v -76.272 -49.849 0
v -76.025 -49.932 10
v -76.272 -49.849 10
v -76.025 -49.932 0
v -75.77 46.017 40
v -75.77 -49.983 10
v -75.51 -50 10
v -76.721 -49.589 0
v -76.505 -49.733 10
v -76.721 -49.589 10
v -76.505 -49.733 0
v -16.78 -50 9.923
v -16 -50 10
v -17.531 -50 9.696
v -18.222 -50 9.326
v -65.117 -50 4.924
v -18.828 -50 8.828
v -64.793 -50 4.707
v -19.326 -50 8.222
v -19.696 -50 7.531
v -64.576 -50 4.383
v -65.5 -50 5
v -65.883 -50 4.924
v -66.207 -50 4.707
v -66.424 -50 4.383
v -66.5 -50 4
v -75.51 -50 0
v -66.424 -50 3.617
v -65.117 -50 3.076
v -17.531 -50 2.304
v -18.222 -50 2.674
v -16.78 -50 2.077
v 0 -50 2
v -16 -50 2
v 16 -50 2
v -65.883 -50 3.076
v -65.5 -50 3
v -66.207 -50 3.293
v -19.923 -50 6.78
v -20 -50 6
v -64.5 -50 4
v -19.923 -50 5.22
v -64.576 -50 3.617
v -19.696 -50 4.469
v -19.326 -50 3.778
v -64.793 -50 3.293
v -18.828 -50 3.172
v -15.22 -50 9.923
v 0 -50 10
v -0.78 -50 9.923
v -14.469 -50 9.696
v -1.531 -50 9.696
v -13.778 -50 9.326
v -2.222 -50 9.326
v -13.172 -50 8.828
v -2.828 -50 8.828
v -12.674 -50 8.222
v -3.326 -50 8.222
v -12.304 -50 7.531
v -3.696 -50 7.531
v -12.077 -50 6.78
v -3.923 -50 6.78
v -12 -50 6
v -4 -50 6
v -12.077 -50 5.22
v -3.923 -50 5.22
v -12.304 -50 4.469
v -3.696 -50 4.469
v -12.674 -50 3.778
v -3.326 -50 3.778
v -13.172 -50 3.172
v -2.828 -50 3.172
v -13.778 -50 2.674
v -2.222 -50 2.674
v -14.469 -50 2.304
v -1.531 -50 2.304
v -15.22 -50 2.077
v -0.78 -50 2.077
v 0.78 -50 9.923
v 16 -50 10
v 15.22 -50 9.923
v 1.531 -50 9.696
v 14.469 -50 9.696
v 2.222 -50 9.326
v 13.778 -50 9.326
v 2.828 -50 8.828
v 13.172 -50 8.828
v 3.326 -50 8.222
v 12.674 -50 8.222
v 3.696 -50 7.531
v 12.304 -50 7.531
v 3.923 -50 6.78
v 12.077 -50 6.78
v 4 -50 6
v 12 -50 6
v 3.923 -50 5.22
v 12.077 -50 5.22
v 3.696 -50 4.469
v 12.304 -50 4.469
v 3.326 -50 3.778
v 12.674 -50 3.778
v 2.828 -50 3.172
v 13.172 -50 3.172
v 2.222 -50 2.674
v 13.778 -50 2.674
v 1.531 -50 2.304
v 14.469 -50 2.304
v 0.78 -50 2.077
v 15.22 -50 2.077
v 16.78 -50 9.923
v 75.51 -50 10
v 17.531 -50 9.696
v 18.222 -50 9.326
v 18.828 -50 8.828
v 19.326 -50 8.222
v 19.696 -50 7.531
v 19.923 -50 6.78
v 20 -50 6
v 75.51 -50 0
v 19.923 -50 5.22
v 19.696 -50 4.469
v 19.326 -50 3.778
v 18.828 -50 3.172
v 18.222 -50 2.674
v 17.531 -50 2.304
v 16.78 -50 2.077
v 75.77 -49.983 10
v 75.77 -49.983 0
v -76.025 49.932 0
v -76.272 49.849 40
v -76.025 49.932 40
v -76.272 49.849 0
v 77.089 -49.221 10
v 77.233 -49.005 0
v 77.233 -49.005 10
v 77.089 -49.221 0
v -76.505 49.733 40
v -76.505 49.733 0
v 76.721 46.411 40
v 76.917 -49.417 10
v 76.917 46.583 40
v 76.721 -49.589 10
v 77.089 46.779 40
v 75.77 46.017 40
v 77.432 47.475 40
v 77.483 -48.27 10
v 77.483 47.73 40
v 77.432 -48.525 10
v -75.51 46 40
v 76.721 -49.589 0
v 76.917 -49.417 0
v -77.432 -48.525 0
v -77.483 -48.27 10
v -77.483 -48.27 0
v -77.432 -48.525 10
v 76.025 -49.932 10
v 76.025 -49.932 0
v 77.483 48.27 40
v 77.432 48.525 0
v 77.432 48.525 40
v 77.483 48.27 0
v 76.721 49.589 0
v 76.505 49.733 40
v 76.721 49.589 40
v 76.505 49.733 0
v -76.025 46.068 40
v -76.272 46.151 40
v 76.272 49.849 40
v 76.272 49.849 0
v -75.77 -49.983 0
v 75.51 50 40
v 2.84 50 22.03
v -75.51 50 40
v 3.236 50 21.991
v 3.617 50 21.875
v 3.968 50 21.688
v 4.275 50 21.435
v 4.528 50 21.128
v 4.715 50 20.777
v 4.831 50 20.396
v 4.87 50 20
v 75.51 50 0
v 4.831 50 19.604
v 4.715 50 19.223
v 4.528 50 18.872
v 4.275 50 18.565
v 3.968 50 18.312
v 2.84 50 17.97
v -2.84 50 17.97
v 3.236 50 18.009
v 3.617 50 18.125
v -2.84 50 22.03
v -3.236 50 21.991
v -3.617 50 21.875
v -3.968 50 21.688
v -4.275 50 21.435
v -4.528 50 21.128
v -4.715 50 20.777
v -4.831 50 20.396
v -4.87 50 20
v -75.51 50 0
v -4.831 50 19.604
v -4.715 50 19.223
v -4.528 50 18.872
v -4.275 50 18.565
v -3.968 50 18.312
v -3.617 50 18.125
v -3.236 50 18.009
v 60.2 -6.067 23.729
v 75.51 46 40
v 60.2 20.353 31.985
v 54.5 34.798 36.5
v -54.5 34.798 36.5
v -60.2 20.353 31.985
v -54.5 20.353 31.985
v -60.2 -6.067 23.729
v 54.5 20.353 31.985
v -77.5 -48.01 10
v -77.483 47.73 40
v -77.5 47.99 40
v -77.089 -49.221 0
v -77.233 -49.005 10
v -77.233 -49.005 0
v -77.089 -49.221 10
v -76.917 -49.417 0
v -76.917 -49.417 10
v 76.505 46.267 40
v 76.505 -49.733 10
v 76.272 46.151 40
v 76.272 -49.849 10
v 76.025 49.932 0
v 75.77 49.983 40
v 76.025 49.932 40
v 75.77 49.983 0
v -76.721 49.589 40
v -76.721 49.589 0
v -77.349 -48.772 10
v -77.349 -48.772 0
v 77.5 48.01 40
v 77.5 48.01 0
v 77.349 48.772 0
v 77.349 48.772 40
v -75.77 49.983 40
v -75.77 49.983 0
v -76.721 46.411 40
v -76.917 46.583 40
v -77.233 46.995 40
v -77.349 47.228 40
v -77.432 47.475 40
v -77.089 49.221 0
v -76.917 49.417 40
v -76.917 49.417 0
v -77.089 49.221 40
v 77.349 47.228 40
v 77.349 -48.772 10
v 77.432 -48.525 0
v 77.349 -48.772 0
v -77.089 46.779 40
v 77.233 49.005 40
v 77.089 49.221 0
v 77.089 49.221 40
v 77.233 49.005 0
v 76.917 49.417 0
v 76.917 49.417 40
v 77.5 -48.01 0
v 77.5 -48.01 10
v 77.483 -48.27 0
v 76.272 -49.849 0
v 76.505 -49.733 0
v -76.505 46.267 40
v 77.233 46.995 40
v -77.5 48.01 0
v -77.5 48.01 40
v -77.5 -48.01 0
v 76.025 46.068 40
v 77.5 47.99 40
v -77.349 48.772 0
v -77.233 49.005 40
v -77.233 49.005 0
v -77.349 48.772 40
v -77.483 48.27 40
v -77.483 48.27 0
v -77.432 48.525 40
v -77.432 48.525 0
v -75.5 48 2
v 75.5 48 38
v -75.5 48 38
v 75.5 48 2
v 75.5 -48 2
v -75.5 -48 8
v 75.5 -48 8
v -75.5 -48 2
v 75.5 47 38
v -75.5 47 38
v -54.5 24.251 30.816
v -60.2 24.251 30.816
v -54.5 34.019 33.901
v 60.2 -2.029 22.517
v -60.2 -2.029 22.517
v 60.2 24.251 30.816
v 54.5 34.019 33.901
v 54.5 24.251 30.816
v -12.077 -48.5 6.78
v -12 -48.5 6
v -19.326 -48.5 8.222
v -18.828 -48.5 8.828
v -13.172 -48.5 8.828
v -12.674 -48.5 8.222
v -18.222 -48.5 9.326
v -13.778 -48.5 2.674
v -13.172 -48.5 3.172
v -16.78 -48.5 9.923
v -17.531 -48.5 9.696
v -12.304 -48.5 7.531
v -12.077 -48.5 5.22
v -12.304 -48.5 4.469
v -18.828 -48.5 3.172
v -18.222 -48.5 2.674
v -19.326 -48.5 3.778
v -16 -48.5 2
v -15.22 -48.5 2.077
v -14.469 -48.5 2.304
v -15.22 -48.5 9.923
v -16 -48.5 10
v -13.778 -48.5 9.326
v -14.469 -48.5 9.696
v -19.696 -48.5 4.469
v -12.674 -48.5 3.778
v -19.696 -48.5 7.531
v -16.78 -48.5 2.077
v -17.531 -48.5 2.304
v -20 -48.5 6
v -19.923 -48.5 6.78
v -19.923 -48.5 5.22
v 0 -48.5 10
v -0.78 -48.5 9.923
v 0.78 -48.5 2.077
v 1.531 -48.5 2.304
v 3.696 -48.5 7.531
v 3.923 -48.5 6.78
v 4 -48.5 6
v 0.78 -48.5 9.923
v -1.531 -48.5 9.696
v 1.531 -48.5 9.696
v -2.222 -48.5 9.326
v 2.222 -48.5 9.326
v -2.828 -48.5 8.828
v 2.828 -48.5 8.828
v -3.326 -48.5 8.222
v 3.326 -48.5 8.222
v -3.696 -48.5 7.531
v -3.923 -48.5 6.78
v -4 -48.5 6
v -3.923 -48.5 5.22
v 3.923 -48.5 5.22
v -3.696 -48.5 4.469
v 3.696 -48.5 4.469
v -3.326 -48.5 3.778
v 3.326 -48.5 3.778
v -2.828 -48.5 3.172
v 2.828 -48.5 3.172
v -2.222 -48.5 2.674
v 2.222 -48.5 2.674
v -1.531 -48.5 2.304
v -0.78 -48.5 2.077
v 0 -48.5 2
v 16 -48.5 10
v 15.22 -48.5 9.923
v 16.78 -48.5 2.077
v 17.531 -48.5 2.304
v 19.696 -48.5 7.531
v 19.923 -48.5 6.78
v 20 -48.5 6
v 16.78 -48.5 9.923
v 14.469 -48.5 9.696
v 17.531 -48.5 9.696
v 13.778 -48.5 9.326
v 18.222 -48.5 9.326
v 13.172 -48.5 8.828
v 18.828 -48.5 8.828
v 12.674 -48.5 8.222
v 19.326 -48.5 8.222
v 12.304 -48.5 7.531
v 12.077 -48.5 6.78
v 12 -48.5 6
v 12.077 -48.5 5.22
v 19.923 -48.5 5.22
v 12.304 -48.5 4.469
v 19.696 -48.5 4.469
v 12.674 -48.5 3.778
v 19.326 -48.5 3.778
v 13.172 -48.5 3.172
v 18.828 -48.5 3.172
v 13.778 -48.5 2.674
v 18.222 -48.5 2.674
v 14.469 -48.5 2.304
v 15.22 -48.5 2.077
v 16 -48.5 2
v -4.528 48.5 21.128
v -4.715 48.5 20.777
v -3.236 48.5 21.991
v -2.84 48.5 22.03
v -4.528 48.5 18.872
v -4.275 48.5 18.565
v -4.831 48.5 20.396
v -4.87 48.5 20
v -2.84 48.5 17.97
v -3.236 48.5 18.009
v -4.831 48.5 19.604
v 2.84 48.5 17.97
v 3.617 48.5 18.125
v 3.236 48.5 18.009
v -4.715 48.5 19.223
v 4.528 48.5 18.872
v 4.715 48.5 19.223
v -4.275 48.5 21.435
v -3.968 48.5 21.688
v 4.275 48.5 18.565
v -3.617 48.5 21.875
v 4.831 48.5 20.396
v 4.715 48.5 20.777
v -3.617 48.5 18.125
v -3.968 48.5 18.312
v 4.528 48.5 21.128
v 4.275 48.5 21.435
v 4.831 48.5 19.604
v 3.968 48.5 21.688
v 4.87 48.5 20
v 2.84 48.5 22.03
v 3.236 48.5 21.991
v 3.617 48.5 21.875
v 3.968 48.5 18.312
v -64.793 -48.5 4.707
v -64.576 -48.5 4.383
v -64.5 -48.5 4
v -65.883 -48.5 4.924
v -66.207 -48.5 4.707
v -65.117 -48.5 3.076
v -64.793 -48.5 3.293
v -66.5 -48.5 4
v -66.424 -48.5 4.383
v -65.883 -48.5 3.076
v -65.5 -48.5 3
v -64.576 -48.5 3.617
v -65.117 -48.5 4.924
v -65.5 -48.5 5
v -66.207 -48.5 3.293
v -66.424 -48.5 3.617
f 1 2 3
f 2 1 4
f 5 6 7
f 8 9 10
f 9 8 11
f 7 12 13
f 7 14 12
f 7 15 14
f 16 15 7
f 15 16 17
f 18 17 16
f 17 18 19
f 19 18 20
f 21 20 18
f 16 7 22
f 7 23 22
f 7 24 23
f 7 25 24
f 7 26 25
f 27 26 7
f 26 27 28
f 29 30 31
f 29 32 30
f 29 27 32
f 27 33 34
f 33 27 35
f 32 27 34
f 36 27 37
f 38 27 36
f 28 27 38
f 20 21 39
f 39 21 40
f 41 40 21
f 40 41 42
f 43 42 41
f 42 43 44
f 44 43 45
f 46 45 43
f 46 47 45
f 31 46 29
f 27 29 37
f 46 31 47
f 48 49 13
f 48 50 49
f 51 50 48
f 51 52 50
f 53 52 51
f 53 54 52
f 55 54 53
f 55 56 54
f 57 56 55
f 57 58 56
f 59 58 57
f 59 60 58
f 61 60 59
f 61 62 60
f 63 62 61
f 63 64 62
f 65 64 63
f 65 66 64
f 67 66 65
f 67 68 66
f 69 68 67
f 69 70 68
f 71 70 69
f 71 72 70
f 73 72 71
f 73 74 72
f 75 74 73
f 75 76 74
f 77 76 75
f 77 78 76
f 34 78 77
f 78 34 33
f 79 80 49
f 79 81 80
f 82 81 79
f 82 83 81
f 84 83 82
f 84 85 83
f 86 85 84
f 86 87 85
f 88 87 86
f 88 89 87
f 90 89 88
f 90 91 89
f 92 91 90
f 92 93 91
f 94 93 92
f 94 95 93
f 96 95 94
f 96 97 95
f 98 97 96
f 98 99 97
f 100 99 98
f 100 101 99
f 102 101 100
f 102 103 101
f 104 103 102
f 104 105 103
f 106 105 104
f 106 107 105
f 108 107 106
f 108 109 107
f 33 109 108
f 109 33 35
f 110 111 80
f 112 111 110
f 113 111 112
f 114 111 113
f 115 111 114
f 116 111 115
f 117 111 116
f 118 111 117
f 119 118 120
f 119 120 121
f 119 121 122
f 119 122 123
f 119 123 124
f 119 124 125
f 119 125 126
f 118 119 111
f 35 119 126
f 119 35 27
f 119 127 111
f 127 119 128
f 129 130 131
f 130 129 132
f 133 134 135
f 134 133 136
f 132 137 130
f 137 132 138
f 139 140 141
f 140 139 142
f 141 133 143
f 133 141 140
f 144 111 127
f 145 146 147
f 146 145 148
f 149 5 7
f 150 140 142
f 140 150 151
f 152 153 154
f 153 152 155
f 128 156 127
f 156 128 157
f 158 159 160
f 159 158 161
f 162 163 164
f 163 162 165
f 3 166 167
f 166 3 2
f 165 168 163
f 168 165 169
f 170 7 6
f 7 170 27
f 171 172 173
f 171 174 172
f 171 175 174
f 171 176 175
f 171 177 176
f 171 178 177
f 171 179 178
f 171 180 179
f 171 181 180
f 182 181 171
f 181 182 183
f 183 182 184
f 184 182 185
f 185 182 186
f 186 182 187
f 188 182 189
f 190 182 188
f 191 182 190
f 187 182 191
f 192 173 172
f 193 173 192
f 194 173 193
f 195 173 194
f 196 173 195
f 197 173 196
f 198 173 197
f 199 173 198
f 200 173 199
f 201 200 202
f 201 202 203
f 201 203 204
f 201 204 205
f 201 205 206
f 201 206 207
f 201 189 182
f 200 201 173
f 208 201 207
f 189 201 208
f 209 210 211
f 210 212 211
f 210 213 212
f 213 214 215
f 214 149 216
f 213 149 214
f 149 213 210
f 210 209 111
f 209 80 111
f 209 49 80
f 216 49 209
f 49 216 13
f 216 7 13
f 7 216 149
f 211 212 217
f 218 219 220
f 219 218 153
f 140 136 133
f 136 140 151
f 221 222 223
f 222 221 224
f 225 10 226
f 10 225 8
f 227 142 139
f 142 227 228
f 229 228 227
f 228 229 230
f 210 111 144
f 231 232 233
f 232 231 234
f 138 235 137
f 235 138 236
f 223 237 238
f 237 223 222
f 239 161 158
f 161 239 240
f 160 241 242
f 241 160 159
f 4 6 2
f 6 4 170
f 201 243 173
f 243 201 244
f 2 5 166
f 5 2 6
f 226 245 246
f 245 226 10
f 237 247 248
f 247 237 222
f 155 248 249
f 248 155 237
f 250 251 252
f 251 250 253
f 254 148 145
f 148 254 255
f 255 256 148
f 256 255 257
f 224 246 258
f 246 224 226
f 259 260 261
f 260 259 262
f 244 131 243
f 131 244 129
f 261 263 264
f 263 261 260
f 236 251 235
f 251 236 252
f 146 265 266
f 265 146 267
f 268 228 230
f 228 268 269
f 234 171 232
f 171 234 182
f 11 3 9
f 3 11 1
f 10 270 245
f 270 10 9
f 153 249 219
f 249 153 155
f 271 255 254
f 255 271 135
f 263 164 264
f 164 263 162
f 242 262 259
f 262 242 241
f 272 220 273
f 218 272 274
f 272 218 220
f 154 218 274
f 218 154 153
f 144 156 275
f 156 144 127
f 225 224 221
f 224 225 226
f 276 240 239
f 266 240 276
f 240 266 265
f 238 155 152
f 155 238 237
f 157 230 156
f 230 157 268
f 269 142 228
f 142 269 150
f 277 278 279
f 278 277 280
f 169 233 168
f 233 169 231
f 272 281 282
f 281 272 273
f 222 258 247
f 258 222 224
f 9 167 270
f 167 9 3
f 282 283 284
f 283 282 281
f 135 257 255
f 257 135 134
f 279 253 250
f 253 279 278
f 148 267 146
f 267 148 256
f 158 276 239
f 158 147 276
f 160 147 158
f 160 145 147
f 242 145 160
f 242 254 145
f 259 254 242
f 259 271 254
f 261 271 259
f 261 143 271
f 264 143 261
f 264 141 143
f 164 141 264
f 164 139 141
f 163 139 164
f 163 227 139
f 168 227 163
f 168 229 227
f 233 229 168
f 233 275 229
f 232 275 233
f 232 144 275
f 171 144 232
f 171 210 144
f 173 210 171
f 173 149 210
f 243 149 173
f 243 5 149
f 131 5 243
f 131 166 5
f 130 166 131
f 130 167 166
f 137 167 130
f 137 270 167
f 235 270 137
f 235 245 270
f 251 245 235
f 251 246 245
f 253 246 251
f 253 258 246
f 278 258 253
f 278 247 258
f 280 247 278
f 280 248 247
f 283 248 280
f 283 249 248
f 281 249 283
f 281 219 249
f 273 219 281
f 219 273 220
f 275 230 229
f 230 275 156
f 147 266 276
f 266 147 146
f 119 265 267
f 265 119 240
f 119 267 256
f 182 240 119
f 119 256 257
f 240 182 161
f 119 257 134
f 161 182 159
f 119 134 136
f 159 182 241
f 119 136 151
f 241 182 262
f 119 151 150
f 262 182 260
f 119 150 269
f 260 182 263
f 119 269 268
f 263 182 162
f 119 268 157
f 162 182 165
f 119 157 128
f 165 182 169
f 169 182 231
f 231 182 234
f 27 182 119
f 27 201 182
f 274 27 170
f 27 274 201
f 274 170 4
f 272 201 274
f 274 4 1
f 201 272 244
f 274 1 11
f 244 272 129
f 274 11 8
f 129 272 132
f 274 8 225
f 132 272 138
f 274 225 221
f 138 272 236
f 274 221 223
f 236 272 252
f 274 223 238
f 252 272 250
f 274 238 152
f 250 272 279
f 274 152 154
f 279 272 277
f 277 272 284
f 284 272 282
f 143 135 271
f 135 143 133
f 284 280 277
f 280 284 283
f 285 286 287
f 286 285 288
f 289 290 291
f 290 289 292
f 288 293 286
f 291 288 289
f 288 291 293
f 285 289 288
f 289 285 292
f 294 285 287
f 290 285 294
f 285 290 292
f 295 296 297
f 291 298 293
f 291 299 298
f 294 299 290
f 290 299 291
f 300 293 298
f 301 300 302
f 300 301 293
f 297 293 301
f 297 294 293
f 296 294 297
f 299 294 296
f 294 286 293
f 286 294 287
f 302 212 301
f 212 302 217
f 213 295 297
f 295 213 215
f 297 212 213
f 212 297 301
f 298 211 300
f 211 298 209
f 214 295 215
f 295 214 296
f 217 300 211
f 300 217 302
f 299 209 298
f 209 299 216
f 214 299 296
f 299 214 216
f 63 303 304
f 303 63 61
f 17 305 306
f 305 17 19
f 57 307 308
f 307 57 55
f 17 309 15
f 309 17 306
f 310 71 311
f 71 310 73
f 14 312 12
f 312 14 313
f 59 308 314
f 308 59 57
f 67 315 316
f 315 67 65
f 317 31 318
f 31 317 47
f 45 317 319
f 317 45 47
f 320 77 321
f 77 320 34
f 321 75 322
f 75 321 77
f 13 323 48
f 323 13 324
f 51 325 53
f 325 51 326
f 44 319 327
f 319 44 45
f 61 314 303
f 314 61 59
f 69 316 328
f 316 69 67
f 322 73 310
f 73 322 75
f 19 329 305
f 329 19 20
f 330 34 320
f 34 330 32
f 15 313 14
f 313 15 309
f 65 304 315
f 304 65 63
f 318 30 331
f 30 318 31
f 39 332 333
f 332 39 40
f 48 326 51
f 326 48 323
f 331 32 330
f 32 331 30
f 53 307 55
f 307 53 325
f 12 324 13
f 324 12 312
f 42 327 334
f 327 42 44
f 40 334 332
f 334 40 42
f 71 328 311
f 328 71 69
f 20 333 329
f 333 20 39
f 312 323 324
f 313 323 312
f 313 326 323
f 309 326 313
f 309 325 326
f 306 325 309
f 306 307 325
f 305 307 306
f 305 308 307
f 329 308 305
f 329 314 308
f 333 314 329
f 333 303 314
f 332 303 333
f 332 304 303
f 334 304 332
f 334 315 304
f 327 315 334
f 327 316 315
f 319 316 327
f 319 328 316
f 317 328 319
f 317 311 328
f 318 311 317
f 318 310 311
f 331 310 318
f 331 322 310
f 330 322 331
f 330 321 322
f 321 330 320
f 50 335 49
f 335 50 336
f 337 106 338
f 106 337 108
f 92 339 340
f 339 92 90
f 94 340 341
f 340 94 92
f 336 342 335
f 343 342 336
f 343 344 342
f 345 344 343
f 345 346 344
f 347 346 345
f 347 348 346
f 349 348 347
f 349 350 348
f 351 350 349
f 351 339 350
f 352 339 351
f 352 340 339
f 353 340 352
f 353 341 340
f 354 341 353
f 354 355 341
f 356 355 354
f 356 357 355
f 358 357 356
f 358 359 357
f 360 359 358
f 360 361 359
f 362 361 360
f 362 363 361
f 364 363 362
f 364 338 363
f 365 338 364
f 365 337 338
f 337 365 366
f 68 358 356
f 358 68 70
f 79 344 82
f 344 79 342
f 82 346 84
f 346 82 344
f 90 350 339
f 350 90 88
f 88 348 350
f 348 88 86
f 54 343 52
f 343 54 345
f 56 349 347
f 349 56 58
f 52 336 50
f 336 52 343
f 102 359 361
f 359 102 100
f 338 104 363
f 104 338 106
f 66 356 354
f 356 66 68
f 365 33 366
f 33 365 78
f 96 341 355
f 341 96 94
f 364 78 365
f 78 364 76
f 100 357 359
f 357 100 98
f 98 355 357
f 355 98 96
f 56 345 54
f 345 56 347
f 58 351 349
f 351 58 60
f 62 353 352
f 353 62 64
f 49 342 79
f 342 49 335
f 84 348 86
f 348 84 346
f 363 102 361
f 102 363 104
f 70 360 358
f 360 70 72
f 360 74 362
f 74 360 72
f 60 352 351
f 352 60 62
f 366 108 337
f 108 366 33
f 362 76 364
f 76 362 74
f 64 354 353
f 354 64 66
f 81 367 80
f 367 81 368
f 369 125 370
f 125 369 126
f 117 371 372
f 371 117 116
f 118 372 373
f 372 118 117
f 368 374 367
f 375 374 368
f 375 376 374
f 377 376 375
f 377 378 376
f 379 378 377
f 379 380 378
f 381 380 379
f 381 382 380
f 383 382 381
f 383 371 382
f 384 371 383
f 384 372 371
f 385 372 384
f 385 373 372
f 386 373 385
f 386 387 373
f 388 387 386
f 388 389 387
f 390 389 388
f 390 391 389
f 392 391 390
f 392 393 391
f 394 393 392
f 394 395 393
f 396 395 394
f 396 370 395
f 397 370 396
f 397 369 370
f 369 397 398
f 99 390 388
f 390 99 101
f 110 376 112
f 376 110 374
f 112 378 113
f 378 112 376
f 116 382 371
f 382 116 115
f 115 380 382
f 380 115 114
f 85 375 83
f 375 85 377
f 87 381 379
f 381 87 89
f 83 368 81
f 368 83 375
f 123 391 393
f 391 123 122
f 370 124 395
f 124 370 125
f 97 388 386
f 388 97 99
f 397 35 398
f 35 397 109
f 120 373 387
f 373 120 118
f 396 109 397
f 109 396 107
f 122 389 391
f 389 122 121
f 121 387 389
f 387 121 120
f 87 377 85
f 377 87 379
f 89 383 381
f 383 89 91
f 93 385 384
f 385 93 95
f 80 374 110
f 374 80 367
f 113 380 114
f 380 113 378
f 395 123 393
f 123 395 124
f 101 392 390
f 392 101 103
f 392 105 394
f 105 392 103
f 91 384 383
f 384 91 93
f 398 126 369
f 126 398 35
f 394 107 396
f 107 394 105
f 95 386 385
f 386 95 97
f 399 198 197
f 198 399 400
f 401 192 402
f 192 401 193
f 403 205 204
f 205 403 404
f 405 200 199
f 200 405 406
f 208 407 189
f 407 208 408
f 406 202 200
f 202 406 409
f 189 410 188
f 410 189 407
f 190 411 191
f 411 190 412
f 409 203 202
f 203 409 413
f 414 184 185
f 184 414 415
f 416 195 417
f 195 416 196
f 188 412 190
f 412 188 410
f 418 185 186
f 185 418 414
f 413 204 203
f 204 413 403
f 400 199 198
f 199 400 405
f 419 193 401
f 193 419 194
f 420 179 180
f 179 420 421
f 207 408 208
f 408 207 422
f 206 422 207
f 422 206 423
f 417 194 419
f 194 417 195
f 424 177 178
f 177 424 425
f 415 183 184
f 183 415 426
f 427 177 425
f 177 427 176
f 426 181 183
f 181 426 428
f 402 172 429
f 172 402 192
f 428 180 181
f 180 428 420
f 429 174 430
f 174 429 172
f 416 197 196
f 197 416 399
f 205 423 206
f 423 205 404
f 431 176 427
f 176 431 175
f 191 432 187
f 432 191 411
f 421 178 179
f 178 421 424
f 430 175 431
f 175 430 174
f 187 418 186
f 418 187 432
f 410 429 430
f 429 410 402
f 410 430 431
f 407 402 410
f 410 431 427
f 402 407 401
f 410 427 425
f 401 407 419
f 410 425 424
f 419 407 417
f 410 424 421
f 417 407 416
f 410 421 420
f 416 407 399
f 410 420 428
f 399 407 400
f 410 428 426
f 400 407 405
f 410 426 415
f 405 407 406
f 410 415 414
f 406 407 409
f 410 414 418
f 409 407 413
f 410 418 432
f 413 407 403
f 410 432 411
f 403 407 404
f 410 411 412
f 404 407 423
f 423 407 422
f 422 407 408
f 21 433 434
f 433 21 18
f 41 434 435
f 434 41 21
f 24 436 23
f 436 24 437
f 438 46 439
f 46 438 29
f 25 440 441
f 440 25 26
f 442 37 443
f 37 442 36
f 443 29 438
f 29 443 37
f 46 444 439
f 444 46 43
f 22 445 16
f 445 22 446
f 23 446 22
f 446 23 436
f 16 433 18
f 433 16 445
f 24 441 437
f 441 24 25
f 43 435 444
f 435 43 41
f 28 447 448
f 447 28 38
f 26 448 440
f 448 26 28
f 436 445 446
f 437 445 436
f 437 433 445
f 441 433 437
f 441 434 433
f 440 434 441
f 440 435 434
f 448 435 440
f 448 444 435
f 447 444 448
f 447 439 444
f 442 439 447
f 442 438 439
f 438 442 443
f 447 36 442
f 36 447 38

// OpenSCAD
color(alpha = 0.85, c = "LightSteelBlue") {
	difference() {
		difference() {
			difference() {
				difference() {
					difference() {
						difference() {
							difference() {
								difference() {
									hull() {
										translate(v = [0, -48.0, 5.0]) {
											hull() {
												translate(v = [-75.51, -0.010000000000000009, 0]) {
													cylinder($fn = 48, center = true, h = 10.0, r = 1.99);
												}
												translate(v = [-75.51, 0.010000000000000009, 0]) {
													cylinder($fn = 48, center = true, h = 10.0, r = 1.99);
												}
												translate(v = [75.51, -0.010000000000000009, 0]) {
													cylinder($fn = 48, center = true, h = 10.0, r = 1.99);
												}
												translate(v = [75.51, 0.010000000000000009, 0]) {
													cylinder($fn = 48, center = true, h = 10.0, r = 1.99);
												}
											}
										}
										translate(v = [0, 48.0, 20.0]) {
											hull() {
												translate(v = [-75.51, -0.010000000000000009, 0]) {
													cylinder($fn = 48, center = true, h = 40.0, r = 1.99);
												}
												translate(v = [-75.51, 0.010000000000000009, 0]) {
													cylinder($fn = 48, center = true, h = 40.0, r = 1.99);
												}
												translate(v = [75.51, -0.010000000000000009, 0]) {
													cylinder($fn = 48, center = true, h = 40.0, r = 1.99);
												}
												translate(v = [75.51, 0.010000000000000009, 0]) {
													cylinder($fn = 48, center = true, h = 40.0, r = 1.99);
												}
											}
										}
									}
									hull() {
										translate(v = [0, -47.5, 5.0]) {
											cube(center = true, size = [151.0, 1.0, 6.0]);
										}
										translate(v = [0, 47.5, 20.0]) {
											cube(center = true, size = [151.0, 1.0, 36.0]);
										}
									}
								}
								translate(v = [0, 0.0, 35.0]) {
									rotate(a = [-16.69924423399362, 0, 0]) {
										cube(center = true, size = [109.0, 65.8, 25]);
									}
								}
							}
							translate(v = [0, 0.0, 30.0]) {
								rotate(a = [-16.69924423399362, 0, 0]) {
									cube(center = true, size = [120.4, 75.4, 15.5]);
								}
							}
						}
						translate(v = [-16.0, -50.0, 6.0]) {
							rotate(a = [90, 0, 0]) {
								cylinder($fn = 32, center = true, d = 8.0, h = 3.0);
							}
						}
					}
					translate(v = [0.0, -50.0, 6.0]) {
						rotate(a = [90, 0, 0]) {
							cylinder($fn = 32, center = true, d = 8.0, h = 3.0);
						}
					}
				}
				translate(v = [16.0, -50.0, 6.0]) {
					rotate(a = [90, 0, 0]) {
						cylinder($fn = 32, center = true, d = 8.0, h = 3.0);
					}
				}
			}
			translate(v = [0, 50.0, 20.0]) {
				rotate(a = [90, 0, 0]) {
					linear_extrude(center = true, height = 3.0) {
						hull() {
							translate(v = [-2.84, 0]) {
								circle($fn = 32, r = 2.0300000000000002);
							}
							translate(v = [2.84, 0]) {
								circle($fn = 32, r = 2.0300000000000002);
							}
						}
					}
				}
			}
		}
		translate(v = [-65.5, -50.0, 4.0]) {
			rotate(a = [90, 0, 0]) {
				cylinder($fn = 16, center = true, d = 2.0, h = 3.0);
			}
		}
	}
}
